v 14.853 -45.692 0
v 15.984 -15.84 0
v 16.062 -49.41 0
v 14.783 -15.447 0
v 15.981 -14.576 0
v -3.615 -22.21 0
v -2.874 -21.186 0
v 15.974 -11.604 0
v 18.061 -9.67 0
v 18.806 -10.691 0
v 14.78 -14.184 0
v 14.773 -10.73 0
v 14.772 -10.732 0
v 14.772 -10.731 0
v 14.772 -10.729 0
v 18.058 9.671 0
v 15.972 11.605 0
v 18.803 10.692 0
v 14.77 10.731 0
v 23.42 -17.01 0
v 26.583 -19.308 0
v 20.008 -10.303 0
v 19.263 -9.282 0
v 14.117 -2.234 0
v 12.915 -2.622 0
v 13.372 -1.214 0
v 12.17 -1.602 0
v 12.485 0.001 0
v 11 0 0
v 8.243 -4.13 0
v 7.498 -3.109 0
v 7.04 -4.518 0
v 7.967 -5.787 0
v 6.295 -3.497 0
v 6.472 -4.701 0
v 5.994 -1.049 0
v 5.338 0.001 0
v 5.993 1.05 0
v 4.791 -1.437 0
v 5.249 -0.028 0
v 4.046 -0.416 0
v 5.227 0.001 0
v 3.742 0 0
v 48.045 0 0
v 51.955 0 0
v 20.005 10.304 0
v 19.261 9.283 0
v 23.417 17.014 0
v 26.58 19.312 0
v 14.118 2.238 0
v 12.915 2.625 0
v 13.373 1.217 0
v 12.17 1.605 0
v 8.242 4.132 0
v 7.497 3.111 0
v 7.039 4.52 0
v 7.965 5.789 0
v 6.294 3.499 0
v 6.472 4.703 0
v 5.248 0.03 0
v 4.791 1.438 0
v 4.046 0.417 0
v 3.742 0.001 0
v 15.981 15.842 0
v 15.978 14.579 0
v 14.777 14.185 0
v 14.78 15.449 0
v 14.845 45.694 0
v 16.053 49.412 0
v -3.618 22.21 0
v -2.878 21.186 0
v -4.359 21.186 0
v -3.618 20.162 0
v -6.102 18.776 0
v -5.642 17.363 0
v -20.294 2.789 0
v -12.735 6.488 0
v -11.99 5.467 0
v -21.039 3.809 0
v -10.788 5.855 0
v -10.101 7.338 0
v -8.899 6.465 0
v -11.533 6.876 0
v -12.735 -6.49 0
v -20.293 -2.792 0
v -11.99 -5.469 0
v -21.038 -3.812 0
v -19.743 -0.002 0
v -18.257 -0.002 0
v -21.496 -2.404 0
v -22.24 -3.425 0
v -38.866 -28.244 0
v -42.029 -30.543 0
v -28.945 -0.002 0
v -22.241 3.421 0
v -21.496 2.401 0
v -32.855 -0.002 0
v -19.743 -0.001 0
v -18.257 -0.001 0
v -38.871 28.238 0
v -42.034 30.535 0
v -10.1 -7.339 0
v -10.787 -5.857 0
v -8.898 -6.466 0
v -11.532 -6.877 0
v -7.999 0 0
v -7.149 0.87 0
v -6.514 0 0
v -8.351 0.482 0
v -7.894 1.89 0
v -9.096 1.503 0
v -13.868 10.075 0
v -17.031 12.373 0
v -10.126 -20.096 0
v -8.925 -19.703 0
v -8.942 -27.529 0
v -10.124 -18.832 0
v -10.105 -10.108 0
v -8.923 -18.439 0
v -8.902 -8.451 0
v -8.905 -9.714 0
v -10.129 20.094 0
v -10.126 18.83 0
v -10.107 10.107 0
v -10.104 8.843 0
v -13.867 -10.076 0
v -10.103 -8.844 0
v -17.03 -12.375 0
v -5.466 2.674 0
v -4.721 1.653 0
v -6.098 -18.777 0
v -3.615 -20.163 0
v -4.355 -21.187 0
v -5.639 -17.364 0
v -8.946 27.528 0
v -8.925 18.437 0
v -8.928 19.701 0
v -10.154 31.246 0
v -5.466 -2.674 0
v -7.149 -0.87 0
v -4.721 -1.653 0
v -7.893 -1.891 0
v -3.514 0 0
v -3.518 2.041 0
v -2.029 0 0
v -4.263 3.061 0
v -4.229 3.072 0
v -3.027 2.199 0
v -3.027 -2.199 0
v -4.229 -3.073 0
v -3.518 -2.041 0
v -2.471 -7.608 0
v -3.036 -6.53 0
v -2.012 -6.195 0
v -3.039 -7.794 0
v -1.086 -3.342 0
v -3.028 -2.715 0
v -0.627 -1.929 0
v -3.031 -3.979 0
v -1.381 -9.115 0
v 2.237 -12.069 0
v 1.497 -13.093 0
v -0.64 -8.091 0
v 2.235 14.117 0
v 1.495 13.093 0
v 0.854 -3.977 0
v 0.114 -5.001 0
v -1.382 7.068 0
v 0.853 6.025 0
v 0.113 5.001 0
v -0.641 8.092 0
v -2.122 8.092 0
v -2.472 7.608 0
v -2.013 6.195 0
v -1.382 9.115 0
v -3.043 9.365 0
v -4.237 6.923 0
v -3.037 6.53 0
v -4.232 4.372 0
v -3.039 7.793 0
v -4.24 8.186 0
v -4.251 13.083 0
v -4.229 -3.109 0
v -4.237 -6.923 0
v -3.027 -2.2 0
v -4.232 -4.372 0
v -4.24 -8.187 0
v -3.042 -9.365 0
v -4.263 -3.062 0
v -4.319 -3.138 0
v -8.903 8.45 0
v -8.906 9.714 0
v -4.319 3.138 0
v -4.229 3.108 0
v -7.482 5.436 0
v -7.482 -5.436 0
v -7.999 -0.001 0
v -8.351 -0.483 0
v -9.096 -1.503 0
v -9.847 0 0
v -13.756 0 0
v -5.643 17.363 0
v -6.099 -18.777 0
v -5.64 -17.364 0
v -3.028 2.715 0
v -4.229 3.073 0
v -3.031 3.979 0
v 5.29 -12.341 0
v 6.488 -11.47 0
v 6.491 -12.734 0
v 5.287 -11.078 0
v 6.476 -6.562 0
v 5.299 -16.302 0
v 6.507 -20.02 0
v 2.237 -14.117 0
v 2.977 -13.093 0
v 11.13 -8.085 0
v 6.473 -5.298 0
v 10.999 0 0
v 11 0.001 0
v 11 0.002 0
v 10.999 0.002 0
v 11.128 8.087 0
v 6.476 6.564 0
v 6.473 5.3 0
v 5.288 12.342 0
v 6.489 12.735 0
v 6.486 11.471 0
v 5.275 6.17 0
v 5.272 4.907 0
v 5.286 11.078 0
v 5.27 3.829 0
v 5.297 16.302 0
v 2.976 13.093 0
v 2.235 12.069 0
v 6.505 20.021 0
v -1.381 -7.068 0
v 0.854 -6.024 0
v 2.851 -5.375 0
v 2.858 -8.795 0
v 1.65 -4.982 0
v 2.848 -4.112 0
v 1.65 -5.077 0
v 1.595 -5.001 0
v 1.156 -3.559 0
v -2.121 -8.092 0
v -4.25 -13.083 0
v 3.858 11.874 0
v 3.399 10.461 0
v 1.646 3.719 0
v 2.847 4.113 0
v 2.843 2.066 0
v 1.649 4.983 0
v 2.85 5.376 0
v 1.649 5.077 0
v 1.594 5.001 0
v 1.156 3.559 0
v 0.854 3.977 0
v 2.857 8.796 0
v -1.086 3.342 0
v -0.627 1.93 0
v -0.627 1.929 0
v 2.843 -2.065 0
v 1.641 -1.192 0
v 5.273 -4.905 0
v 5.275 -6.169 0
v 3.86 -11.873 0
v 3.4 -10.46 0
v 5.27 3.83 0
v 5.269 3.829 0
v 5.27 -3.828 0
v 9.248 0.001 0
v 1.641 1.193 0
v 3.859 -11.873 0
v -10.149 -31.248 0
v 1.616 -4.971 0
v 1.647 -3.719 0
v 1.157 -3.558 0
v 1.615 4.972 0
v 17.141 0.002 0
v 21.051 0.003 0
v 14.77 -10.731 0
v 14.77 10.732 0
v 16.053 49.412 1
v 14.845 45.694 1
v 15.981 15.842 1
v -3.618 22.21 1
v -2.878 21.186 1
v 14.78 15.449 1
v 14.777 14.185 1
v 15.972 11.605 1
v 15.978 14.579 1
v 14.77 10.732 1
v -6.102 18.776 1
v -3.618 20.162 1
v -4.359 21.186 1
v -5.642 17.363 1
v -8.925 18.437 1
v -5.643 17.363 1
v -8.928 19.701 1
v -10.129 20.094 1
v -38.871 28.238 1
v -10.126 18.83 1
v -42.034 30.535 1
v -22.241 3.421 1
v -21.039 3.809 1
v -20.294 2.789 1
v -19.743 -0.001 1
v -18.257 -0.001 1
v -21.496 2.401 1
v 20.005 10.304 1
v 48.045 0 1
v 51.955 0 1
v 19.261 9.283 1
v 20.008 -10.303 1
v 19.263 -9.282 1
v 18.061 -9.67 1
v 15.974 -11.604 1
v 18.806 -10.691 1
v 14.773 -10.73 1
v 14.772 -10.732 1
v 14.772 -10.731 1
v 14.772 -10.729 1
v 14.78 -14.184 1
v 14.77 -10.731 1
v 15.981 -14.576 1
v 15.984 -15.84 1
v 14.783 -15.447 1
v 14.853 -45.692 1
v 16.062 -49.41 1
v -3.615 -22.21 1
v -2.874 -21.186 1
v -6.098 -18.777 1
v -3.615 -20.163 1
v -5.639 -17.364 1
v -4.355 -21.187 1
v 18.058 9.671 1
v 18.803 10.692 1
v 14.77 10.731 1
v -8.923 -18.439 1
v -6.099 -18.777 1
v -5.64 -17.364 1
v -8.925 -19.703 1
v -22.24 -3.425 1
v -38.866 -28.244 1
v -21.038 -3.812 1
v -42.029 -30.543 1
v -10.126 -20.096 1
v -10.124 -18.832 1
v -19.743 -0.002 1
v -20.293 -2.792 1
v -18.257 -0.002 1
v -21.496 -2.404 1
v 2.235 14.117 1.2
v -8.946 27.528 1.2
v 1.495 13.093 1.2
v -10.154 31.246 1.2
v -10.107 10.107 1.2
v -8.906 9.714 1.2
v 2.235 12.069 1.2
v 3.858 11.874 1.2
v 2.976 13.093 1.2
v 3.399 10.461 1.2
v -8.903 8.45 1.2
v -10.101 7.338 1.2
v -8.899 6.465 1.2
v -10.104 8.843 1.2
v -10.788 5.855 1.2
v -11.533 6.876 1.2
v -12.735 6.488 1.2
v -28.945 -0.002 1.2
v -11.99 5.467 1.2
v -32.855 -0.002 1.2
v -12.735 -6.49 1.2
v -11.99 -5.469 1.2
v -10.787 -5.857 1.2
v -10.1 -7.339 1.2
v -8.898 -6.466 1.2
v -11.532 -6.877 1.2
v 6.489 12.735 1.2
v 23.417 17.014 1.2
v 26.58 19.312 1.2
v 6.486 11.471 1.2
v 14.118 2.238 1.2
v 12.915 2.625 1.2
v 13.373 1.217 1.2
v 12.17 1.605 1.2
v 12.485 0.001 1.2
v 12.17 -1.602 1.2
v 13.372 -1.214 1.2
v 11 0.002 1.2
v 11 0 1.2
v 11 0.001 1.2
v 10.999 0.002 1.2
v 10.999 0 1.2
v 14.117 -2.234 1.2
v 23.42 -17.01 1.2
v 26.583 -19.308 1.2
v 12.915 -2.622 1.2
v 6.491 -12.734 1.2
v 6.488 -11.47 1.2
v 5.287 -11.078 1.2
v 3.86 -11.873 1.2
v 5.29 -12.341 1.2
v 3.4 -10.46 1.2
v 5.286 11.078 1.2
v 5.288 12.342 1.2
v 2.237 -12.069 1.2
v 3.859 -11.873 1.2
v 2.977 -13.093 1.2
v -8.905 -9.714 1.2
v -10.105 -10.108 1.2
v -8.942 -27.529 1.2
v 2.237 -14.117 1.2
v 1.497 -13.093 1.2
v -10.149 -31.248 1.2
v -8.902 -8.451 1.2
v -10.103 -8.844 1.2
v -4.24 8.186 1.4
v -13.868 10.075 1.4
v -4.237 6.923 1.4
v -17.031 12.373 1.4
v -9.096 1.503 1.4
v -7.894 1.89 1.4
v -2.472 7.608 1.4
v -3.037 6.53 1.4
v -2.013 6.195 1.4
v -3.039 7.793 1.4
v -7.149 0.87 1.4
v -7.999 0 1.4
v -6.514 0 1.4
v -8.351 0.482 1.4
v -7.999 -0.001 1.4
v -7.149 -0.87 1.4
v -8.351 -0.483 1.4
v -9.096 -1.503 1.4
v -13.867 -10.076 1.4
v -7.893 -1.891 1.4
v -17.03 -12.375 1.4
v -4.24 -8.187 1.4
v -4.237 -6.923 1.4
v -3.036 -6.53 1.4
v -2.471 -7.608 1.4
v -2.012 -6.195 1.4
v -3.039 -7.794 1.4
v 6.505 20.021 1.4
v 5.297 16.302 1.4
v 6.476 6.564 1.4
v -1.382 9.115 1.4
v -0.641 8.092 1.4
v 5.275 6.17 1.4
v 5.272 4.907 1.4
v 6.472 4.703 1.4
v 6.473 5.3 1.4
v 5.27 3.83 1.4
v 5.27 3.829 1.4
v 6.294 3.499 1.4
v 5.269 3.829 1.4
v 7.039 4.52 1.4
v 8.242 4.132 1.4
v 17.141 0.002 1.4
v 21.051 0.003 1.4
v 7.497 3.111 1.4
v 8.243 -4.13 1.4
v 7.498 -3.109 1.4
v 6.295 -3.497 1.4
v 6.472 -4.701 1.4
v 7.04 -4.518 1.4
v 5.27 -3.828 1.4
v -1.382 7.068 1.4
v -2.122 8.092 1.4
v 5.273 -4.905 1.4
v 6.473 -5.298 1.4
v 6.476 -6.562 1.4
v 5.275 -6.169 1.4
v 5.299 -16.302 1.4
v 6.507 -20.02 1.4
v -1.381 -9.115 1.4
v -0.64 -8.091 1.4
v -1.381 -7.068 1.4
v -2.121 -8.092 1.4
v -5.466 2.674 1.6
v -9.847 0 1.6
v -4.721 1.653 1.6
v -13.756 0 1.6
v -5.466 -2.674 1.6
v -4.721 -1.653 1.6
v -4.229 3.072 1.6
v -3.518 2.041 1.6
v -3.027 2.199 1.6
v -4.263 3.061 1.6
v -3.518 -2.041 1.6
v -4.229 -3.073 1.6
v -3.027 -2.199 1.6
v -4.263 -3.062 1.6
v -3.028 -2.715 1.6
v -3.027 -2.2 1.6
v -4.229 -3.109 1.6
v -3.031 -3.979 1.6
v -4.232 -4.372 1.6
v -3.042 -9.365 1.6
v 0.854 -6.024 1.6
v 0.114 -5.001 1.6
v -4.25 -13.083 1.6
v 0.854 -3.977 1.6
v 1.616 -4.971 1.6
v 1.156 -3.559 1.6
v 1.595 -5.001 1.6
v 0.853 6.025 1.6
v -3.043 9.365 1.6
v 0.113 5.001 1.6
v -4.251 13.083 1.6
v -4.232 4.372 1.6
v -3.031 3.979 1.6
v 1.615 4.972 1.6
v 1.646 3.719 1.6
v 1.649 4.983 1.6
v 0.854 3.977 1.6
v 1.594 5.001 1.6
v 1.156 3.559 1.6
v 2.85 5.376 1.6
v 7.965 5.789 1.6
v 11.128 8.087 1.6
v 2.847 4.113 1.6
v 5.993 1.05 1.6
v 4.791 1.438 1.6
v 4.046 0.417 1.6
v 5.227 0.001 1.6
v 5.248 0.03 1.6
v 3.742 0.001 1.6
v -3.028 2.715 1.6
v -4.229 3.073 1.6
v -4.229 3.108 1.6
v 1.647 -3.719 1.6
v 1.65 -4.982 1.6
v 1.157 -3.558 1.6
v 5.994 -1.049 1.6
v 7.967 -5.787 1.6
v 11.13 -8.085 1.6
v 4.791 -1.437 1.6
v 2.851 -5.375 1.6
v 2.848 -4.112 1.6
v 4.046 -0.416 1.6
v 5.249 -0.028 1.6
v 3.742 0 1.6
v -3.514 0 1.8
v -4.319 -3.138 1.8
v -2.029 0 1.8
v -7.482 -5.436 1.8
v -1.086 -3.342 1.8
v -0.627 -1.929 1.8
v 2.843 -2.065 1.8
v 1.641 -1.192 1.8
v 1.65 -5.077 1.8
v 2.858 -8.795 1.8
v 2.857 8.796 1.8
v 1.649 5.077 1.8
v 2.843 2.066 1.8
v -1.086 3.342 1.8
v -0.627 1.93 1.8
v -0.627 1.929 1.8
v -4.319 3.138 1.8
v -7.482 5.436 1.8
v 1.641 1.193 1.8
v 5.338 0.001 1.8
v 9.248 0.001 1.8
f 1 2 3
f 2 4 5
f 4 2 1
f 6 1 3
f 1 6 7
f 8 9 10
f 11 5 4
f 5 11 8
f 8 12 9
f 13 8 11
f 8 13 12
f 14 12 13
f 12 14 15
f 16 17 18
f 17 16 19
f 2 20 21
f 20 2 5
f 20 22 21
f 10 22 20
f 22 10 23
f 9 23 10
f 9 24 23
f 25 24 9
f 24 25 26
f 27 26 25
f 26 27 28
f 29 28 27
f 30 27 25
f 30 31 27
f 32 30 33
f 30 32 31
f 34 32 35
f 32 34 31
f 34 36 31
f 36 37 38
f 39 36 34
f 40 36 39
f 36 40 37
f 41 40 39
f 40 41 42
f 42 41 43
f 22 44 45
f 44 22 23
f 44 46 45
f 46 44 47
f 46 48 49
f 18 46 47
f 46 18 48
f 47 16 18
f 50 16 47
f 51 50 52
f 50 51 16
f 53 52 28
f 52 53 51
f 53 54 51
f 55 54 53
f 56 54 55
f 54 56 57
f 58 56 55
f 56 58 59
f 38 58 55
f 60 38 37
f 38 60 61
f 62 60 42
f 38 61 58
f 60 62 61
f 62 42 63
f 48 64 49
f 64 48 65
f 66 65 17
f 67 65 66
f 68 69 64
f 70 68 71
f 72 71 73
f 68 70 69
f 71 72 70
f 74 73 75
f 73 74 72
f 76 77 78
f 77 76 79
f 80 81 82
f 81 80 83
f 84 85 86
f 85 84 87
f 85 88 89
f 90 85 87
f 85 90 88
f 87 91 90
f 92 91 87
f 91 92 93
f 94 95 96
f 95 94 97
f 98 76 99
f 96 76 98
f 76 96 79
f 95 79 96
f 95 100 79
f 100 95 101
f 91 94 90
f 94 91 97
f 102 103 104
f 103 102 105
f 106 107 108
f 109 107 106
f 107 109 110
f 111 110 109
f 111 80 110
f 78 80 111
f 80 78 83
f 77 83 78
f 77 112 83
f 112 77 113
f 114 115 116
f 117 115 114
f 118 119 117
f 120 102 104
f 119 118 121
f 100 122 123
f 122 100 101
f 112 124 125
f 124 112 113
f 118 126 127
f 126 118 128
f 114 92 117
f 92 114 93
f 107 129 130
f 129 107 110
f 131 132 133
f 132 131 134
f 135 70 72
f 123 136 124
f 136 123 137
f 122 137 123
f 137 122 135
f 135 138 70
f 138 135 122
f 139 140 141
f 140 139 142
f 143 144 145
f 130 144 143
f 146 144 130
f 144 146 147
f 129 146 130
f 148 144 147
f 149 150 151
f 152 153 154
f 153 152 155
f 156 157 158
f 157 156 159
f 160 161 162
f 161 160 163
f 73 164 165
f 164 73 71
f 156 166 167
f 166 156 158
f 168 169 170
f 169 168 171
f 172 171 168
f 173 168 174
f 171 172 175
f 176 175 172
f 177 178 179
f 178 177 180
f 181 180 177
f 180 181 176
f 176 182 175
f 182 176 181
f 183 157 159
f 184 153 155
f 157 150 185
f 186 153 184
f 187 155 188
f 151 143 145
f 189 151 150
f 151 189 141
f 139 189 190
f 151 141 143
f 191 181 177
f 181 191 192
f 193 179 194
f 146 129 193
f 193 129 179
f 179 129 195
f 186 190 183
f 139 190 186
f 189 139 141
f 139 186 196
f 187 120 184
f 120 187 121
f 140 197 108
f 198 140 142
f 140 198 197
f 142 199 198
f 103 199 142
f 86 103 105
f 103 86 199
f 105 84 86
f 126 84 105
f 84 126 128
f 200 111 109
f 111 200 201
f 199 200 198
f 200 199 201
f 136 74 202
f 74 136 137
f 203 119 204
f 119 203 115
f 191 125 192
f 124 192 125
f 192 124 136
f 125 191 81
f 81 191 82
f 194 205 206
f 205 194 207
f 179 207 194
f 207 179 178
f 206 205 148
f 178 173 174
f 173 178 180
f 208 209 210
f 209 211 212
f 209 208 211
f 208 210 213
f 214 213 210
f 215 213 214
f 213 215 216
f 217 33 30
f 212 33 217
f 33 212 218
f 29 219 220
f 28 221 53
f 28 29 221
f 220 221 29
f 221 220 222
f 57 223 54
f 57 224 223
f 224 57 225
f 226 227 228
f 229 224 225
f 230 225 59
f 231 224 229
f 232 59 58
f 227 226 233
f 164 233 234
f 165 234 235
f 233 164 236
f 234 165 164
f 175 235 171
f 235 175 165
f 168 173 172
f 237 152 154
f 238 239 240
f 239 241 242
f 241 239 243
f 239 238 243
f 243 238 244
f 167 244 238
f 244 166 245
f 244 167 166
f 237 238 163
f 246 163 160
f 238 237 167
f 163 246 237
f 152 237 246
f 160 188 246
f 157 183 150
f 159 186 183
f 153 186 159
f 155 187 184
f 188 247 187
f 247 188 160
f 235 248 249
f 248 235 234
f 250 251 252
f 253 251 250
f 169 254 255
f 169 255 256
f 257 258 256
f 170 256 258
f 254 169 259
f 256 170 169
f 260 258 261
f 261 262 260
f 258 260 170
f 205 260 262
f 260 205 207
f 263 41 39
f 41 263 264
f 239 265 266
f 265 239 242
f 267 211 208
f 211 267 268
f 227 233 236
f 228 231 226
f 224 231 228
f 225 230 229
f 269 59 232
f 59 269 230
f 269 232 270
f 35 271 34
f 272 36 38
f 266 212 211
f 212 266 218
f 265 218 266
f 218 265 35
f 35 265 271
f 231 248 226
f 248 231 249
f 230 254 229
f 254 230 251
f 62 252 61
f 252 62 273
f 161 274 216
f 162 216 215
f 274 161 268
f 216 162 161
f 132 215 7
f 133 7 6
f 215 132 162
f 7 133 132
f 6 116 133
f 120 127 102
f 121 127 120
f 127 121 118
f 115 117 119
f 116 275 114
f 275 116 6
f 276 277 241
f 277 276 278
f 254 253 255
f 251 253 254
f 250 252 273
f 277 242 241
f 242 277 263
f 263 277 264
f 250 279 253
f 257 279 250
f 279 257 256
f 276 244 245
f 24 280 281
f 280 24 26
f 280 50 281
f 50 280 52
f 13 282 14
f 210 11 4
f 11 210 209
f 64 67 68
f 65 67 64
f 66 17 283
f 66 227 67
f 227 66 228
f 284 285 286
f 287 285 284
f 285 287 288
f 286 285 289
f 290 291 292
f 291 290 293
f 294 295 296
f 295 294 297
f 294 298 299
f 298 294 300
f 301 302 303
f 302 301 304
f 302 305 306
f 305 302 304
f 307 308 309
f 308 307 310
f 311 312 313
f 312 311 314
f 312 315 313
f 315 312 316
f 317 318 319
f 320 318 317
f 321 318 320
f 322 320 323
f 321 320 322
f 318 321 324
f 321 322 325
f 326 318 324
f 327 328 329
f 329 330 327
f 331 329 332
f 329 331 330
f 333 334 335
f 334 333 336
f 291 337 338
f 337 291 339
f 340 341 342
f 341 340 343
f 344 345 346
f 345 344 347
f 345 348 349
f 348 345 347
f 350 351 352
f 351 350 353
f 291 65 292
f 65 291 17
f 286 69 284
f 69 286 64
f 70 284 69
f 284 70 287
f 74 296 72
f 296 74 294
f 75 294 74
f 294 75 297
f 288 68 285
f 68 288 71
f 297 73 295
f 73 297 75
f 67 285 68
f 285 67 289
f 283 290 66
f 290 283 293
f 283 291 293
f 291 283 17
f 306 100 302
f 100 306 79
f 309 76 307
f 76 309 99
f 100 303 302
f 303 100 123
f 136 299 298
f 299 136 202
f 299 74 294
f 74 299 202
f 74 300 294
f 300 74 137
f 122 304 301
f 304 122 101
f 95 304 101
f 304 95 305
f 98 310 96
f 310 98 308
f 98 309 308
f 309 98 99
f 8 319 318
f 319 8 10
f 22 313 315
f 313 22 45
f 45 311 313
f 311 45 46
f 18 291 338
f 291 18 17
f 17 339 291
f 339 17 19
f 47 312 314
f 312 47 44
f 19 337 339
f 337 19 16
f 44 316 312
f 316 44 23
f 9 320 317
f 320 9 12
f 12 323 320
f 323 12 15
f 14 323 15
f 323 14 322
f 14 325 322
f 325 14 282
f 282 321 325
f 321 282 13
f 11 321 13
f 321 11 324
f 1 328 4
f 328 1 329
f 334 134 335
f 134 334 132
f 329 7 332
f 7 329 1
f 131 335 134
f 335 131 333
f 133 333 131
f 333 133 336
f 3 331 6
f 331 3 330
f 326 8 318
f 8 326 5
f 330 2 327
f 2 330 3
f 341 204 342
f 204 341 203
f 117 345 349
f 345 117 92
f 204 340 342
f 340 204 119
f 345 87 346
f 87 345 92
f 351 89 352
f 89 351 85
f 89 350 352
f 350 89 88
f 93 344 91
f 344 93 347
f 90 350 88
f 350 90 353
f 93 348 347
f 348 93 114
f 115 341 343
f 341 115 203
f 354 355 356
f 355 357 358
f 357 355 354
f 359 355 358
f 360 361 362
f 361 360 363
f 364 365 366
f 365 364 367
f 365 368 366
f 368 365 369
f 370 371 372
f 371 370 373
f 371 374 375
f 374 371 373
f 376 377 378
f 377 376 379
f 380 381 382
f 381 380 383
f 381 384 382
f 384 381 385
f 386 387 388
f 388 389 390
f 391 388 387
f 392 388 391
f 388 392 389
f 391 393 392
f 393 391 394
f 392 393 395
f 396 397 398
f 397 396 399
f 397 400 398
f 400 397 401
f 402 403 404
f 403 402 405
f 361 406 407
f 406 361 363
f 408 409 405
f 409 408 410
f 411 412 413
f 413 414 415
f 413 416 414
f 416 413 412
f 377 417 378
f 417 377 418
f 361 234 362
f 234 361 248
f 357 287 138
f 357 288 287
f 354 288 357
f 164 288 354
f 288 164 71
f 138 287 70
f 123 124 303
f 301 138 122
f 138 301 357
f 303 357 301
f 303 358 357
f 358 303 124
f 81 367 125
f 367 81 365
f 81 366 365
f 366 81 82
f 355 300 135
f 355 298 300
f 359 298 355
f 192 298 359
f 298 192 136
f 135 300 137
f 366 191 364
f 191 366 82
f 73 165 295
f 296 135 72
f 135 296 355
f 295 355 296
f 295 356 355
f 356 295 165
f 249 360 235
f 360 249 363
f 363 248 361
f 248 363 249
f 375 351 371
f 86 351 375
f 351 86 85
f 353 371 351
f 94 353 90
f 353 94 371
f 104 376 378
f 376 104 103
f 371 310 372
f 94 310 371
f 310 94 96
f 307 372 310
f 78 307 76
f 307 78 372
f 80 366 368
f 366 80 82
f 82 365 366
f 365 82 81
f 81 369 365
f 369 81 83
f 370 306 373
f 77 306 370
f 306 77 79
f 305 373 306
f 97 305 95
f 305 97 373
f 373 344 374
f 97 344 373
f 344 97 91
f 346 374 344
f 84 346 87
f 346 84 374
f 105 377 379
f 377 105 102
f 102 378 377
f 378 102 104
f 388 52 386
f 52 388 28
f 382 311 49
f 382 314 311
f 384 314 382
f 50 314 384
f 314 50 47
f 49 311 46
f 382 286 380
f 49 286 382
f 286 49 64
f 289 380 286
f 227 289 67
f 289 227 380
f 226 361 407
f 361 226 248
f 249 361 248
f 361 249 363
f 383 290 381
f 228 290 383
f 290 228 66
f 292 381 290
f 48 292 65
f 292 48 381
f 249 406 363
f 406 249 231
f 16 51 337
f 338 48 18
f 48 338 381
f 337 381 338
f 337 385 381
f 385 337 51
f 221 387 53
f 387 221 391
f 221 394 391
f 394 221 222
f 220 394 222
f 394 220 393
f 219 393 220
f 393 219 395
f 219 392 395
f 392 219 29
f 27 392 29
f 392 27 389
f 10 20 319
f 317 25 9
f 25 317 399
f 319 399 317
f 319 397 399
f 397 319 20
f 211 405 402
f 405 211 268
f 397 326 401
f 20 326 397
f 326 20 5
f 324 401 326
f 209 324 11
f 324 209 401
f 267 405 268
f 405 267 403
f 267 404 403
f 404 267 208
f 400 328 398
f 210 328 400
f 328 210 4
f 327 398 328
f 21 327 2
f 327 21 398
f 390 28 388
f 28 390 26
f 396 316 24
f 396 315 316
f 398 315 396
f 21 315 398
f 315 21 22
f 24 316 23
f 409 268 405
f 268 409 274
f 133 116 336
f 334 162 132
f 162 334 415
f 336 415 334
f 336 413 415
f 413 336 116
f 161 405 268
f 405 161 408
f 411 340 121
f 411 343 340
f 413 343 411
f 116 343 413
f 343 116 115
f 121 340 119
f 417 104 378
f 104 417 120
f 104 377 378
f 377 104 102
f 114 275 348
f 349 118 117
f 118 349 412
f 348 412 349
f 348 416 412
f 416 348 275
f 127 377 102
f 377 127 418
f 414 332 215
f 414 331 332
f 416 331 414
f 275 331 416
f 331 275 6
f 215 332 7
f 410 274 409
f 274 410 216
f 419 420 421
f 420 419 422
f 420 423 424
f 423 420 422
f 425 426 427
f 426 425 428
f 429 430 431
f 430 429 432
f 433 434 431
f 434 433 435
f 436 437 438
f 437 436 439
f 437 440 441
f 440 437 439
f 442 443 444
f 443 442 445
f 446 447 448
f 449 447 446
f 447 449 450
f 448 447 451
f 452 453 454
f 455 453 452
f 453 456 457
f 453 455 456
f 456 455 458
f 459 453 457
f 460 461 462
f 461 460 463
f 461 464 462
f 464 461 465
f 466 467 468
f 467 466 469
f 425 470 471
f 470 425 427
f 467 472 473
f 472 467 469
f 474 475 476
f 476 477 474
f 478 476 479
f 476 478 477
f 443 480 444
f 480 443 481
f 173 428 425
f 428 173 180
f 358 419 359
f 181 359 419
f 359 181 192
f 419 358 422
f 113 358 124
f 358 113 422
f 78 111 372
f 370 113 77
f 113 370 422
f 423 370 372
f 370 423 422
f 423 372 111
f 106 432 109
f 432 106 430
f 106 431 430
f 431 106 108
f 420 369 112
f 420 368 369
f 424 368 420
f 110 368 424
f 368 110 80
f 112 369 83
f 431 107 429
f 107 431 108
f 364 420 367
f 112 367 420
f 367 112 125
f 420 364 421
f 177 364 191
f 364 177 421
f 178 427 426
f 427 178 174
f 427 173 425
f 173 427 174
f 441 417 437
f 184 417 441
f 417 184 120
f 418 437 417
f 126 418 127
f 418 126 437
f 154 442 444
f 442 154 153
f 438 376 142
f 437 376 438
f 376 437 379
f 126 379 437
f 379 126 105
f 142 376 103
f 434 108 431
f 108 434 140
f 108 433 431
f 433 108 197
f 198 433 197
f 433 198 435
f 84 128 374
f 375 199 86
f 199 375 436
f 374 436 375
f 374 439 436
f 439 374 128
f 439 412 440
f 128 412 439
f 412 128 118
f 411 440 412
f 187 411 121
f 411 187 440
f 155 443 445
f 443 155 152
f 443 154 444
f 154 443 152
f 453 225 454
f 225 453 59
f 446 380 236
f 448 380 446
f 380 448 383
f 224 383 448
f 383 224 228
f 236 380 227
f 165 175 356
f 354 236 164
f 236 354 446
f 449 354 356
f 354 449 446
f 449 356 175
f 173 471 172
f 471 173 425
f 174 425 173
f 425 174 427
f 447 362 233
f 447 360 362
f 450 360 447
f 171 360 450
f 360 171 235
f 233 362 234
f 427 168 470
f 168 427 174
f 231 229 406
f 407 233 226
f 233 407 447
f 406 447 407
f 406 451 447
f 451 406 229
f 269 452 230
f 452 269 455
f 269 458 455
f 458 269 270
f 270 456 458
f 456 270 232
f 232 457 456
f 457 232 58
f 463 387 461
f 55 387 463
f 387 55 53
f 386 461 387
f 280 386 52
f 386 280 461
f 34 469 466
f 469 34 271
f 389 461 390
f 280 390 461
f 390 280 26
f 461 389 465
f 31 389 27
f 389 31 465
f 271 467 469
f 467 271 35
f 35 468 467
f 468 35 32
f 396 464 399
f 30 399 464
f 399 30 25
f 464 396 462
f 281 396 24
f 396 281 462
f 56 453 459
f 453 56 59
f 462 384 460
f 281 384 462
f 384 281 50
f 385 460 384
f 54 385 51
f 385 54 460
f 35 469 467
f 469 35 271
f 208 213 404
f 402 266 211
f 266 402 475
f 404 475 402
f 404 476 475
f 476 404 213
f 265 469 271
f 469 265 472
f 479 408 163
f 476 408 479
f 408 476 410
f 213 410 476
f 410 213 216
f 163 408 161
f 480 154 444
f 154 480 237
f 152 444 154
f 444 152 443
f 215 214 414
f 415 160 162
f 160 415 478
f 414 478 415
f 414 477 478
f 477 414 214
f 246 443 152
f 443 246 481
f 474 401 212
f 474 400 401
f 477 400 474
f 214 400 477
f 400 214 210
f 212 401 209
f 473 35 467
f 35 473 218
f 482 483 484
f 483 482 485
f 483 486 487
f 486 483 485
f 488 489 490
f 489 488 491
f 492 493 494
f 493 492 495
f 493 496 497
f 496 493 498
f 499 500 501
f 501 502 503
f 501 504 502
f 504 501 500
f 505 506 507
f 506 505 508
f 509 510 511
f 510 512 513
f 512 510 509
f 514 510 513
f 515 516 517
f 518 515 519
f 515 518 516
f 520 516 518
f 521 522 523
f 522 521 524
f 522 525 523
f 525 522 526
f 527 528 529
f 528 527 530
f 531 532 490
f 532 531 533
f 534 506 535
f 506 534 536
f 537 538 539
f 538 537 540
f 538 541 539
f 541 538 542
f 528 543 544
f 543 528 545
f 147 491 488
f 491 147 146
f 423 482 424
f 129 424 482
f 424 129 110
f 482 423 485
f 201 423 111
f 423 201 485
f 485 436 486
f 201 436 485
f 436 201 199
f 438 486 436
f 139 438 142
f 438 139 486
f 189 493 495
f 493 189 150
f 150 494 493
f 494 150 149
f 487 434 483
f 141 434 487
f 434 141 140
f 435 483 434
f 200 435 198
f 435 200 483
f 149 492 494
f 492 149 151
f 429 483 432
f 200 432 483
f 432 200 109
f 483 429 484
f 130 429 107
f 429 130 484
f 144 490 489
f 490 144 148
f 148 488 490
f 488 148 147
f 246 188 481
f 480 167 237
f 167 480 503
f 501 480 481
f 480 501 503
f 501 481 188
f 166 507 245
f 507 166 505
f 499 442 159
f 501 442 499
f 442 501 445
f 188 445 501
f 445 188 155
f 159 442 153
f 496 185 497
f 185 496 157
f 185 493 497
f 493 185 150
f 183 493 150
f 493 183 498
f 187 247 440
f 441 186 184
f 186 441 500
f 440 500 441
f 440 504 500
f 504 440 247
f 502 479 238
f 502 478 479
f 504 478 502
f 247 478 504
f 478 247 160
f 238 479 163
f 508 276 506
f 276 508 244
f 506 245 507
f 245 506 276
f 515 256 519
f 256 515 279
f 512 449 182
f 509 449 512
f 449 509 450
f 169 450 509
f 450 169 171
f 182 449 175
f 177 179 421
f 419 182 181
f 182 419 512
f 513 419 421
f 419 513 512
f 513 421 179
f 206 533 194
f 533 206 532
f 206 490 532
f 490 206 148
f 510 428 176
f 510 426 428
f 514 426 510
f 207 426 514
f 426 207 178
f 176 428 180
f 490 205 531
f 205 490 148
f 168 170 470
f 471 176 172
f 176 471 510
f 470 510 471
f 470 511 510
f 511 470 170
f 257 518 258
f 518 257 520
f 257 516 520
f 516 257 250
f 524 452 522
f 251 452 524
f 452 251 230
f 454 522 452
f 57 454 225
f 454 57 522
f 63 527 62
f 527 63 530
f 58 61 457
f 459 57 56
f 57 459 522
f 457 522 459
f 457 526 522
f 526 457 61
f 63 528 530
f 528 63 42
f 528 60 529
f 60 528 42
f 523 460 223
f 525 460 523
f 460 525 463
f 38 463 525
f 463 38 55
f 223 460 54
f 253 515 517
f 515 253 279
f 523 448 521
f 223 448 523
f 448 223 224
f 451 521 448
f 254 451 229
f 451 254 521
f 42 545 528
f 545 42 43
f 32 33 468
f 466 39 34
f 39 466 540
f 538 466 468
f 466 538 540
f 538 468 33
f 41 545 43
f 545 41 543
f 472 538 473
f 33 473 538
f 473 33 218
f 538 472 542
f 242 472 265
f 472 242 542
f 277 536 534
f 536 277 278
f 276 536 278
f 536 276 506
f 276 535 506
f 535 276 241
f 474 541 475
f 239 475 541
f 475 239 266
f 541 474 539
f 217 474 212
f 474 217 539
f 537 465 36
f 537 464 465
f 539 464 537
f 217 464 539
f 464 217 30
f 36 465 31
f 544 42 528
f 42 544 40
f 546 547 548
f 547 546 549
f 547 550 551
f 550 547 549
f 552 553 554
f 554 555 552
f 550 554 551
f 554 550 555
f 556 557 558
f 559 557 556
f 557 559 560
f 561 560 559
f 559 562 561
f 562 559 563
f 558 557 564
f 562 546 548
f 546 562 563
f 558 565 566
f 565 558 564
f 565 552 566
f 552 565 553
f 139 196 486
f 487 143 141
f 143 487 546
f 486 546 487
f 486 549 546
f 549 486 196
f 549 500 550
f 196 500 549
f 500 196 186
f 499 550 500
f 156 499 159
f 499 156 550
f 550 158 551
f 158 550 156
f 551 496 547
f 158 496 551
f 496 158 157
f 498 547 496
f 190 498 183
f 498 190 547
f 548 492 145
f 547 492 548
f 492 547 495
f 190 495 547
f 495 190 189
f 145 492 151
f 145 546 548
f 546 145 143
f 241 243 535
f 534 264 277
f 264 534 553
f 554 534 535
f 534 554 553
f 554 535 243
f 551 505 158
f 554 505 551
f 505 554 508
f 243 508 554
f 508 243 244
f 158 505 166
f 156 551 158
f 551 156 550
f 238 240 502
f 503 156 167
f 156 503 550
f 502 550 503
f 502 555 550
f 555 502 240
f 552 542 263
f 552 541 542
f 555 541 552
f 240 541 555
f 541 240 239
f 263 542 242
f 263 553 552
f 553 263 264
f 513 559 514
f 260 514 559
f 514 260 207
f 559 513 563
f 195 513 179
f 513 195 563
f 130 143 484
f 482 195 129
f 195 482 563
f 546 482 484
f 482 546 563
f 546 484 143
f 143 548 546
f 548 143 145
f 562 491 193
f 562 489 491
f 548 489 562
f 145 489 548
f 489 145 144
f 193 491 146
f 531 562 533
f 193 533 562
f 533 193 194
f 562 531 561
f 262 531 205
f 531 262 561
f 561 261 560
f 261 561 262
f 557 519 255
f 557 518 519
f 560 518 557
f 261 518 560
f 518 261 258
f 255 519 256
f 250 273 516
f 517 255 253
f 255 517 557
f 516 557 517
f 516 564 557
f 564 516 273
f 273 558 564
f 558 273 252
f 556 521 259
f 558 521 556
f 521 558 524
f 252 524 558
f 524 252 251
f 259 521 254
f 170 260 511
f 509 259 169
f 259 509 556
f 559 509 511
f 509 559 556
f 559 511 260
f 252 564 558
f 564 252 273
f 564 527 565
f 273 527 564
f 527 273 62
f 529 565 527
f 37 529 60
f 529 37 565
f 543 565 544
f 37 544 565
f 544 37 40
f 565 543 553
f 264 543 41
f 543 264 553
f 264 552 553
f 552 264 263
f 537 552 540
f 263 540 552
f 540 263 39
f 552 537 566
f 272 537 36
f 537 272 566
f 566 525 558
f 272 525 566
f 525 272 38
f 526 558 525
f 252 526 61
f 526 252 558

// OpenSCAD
// xmas.scad
//   X-mas related stuff, stars for decoration
//
// Background:
//   - the stars can be parameterized to create
//     a wealth of various shapes
//   - printed with a layer step of 0.2 mm
//   - CAD manual: http://www.openscad.org/documentation.html
//   - see also dodekaeder.scad as "Adventskalender"
//   - hosted on:
//     git@github.com:Github6am/am_parts3D.git
//
// Andreas Merz 2021-12-21, v1.0 
// GPLv3 or later, see http://www.gnu.org/licenses


//-----------------------------------------------
// stars for decoration
//-----------------------------------------------

// a 2D single edge polygon
module star_edge1(
  w=1,       // width
  a=18,      // radius outer circle
  b=10,       // radius inner circle
  n=4,       // number of rays
  ) {
      c=cos(180/n);
      s=sin(180/n);
      bb=[c, s]*b;
      aa=[a, 0];
      phi=atan(s*b/(a-b*c));    // tip angle/2
      w2=w/2;
      da=w2*[1/sin(phi),0];
      eb=[c, s];
      en=[sin(phi), cos(phi)];
      t=eb*en;
      db=w2*eb/t;
      polygon( points=[aa-da, aa+da, bb+db, bb-db]);
}

// a 2D star shape
module star_edge2(
  w=2,     // width
  a=80,    // radius outer circle
  b=30,     // radius inner circle
  n=5,       // number of rays
  ) {
      for (i = [0 : n-1]) {
	rotate([0, 0, 360.01/n*i])
	union() {
            star_edge1(w=w, a=a, b=b, n=n);
	  mirror([0,1,0]) 
            star_edge1(w=w, a=a, b=b, n=n);
	}
      }
}

// the 3D multi star
module star(
  h=0.8,     // height
  w=0.8,     // width
  a=80,      // radius outer circle
  b=30,      // radius inner circle
  n=5,       // number of rays
  m=4,       // number of scaled and rotated stars
  rot=0.5,   // rotation in units of rays
  scl=0.618, // scale for every sub star
  zinc=0     // heigth increment for every sub star
  ) {
      //s1=b/a*1.618;
      s1=scl;
      for (i =[0 : m-1] ) {
        s = exp(ln(s1)*i);    // older openscad versions do not know s1^i
	//echo( s );
        rotate([0, 0, rot*360/n*i]) 
          linear_extrude( height = (h+i*zinc))
            star_edge2(w=w, a=(a*s), b=(b*s), n=n);
      }
}



//---------------- Instances ---------------------


//star();
//star( h=1.0, w=1.2, a=80, b=30,   n=5, m=5, rot=0.5,   scl=0.618, zinc=0.2);
star( h=1.0, w=1.2, a=50, b=19,   n=5, m=5, rot=0.5,   scl=0.618, zinc=0.2);
//star( h=1.0, w=1.2, a=50, b=19,   n=5, m=7, rot=0.065, scl=0.79,  zinc=0.2);

//star( h=1.0, w=1.2, a=50, b=10,   n=6, m=3, rot=0.5,   scl=0.618, zinc=0.2);
//star( h=1.0, w=2.2, a=50, b=25,   n=3, m=2, rot=0.5,   scl=1.0,   zinc=0.0); // davidstern
//star( h=1.0, w=1.2, a=50, b=31.7, n=8, m=7, rot=0.18,  scl=0.8,   zinc=0.2);

//star( h=1.0, w=1.2, a=80, b=12,   n=3, m=5, rot=4/12,   scl=0.7, zinc=0.2);
//star( h=1.0, w=1.2, a=80, b=12,   n=4, m=6, rot=2/5,   scl=0.8, zinc=0.2);
